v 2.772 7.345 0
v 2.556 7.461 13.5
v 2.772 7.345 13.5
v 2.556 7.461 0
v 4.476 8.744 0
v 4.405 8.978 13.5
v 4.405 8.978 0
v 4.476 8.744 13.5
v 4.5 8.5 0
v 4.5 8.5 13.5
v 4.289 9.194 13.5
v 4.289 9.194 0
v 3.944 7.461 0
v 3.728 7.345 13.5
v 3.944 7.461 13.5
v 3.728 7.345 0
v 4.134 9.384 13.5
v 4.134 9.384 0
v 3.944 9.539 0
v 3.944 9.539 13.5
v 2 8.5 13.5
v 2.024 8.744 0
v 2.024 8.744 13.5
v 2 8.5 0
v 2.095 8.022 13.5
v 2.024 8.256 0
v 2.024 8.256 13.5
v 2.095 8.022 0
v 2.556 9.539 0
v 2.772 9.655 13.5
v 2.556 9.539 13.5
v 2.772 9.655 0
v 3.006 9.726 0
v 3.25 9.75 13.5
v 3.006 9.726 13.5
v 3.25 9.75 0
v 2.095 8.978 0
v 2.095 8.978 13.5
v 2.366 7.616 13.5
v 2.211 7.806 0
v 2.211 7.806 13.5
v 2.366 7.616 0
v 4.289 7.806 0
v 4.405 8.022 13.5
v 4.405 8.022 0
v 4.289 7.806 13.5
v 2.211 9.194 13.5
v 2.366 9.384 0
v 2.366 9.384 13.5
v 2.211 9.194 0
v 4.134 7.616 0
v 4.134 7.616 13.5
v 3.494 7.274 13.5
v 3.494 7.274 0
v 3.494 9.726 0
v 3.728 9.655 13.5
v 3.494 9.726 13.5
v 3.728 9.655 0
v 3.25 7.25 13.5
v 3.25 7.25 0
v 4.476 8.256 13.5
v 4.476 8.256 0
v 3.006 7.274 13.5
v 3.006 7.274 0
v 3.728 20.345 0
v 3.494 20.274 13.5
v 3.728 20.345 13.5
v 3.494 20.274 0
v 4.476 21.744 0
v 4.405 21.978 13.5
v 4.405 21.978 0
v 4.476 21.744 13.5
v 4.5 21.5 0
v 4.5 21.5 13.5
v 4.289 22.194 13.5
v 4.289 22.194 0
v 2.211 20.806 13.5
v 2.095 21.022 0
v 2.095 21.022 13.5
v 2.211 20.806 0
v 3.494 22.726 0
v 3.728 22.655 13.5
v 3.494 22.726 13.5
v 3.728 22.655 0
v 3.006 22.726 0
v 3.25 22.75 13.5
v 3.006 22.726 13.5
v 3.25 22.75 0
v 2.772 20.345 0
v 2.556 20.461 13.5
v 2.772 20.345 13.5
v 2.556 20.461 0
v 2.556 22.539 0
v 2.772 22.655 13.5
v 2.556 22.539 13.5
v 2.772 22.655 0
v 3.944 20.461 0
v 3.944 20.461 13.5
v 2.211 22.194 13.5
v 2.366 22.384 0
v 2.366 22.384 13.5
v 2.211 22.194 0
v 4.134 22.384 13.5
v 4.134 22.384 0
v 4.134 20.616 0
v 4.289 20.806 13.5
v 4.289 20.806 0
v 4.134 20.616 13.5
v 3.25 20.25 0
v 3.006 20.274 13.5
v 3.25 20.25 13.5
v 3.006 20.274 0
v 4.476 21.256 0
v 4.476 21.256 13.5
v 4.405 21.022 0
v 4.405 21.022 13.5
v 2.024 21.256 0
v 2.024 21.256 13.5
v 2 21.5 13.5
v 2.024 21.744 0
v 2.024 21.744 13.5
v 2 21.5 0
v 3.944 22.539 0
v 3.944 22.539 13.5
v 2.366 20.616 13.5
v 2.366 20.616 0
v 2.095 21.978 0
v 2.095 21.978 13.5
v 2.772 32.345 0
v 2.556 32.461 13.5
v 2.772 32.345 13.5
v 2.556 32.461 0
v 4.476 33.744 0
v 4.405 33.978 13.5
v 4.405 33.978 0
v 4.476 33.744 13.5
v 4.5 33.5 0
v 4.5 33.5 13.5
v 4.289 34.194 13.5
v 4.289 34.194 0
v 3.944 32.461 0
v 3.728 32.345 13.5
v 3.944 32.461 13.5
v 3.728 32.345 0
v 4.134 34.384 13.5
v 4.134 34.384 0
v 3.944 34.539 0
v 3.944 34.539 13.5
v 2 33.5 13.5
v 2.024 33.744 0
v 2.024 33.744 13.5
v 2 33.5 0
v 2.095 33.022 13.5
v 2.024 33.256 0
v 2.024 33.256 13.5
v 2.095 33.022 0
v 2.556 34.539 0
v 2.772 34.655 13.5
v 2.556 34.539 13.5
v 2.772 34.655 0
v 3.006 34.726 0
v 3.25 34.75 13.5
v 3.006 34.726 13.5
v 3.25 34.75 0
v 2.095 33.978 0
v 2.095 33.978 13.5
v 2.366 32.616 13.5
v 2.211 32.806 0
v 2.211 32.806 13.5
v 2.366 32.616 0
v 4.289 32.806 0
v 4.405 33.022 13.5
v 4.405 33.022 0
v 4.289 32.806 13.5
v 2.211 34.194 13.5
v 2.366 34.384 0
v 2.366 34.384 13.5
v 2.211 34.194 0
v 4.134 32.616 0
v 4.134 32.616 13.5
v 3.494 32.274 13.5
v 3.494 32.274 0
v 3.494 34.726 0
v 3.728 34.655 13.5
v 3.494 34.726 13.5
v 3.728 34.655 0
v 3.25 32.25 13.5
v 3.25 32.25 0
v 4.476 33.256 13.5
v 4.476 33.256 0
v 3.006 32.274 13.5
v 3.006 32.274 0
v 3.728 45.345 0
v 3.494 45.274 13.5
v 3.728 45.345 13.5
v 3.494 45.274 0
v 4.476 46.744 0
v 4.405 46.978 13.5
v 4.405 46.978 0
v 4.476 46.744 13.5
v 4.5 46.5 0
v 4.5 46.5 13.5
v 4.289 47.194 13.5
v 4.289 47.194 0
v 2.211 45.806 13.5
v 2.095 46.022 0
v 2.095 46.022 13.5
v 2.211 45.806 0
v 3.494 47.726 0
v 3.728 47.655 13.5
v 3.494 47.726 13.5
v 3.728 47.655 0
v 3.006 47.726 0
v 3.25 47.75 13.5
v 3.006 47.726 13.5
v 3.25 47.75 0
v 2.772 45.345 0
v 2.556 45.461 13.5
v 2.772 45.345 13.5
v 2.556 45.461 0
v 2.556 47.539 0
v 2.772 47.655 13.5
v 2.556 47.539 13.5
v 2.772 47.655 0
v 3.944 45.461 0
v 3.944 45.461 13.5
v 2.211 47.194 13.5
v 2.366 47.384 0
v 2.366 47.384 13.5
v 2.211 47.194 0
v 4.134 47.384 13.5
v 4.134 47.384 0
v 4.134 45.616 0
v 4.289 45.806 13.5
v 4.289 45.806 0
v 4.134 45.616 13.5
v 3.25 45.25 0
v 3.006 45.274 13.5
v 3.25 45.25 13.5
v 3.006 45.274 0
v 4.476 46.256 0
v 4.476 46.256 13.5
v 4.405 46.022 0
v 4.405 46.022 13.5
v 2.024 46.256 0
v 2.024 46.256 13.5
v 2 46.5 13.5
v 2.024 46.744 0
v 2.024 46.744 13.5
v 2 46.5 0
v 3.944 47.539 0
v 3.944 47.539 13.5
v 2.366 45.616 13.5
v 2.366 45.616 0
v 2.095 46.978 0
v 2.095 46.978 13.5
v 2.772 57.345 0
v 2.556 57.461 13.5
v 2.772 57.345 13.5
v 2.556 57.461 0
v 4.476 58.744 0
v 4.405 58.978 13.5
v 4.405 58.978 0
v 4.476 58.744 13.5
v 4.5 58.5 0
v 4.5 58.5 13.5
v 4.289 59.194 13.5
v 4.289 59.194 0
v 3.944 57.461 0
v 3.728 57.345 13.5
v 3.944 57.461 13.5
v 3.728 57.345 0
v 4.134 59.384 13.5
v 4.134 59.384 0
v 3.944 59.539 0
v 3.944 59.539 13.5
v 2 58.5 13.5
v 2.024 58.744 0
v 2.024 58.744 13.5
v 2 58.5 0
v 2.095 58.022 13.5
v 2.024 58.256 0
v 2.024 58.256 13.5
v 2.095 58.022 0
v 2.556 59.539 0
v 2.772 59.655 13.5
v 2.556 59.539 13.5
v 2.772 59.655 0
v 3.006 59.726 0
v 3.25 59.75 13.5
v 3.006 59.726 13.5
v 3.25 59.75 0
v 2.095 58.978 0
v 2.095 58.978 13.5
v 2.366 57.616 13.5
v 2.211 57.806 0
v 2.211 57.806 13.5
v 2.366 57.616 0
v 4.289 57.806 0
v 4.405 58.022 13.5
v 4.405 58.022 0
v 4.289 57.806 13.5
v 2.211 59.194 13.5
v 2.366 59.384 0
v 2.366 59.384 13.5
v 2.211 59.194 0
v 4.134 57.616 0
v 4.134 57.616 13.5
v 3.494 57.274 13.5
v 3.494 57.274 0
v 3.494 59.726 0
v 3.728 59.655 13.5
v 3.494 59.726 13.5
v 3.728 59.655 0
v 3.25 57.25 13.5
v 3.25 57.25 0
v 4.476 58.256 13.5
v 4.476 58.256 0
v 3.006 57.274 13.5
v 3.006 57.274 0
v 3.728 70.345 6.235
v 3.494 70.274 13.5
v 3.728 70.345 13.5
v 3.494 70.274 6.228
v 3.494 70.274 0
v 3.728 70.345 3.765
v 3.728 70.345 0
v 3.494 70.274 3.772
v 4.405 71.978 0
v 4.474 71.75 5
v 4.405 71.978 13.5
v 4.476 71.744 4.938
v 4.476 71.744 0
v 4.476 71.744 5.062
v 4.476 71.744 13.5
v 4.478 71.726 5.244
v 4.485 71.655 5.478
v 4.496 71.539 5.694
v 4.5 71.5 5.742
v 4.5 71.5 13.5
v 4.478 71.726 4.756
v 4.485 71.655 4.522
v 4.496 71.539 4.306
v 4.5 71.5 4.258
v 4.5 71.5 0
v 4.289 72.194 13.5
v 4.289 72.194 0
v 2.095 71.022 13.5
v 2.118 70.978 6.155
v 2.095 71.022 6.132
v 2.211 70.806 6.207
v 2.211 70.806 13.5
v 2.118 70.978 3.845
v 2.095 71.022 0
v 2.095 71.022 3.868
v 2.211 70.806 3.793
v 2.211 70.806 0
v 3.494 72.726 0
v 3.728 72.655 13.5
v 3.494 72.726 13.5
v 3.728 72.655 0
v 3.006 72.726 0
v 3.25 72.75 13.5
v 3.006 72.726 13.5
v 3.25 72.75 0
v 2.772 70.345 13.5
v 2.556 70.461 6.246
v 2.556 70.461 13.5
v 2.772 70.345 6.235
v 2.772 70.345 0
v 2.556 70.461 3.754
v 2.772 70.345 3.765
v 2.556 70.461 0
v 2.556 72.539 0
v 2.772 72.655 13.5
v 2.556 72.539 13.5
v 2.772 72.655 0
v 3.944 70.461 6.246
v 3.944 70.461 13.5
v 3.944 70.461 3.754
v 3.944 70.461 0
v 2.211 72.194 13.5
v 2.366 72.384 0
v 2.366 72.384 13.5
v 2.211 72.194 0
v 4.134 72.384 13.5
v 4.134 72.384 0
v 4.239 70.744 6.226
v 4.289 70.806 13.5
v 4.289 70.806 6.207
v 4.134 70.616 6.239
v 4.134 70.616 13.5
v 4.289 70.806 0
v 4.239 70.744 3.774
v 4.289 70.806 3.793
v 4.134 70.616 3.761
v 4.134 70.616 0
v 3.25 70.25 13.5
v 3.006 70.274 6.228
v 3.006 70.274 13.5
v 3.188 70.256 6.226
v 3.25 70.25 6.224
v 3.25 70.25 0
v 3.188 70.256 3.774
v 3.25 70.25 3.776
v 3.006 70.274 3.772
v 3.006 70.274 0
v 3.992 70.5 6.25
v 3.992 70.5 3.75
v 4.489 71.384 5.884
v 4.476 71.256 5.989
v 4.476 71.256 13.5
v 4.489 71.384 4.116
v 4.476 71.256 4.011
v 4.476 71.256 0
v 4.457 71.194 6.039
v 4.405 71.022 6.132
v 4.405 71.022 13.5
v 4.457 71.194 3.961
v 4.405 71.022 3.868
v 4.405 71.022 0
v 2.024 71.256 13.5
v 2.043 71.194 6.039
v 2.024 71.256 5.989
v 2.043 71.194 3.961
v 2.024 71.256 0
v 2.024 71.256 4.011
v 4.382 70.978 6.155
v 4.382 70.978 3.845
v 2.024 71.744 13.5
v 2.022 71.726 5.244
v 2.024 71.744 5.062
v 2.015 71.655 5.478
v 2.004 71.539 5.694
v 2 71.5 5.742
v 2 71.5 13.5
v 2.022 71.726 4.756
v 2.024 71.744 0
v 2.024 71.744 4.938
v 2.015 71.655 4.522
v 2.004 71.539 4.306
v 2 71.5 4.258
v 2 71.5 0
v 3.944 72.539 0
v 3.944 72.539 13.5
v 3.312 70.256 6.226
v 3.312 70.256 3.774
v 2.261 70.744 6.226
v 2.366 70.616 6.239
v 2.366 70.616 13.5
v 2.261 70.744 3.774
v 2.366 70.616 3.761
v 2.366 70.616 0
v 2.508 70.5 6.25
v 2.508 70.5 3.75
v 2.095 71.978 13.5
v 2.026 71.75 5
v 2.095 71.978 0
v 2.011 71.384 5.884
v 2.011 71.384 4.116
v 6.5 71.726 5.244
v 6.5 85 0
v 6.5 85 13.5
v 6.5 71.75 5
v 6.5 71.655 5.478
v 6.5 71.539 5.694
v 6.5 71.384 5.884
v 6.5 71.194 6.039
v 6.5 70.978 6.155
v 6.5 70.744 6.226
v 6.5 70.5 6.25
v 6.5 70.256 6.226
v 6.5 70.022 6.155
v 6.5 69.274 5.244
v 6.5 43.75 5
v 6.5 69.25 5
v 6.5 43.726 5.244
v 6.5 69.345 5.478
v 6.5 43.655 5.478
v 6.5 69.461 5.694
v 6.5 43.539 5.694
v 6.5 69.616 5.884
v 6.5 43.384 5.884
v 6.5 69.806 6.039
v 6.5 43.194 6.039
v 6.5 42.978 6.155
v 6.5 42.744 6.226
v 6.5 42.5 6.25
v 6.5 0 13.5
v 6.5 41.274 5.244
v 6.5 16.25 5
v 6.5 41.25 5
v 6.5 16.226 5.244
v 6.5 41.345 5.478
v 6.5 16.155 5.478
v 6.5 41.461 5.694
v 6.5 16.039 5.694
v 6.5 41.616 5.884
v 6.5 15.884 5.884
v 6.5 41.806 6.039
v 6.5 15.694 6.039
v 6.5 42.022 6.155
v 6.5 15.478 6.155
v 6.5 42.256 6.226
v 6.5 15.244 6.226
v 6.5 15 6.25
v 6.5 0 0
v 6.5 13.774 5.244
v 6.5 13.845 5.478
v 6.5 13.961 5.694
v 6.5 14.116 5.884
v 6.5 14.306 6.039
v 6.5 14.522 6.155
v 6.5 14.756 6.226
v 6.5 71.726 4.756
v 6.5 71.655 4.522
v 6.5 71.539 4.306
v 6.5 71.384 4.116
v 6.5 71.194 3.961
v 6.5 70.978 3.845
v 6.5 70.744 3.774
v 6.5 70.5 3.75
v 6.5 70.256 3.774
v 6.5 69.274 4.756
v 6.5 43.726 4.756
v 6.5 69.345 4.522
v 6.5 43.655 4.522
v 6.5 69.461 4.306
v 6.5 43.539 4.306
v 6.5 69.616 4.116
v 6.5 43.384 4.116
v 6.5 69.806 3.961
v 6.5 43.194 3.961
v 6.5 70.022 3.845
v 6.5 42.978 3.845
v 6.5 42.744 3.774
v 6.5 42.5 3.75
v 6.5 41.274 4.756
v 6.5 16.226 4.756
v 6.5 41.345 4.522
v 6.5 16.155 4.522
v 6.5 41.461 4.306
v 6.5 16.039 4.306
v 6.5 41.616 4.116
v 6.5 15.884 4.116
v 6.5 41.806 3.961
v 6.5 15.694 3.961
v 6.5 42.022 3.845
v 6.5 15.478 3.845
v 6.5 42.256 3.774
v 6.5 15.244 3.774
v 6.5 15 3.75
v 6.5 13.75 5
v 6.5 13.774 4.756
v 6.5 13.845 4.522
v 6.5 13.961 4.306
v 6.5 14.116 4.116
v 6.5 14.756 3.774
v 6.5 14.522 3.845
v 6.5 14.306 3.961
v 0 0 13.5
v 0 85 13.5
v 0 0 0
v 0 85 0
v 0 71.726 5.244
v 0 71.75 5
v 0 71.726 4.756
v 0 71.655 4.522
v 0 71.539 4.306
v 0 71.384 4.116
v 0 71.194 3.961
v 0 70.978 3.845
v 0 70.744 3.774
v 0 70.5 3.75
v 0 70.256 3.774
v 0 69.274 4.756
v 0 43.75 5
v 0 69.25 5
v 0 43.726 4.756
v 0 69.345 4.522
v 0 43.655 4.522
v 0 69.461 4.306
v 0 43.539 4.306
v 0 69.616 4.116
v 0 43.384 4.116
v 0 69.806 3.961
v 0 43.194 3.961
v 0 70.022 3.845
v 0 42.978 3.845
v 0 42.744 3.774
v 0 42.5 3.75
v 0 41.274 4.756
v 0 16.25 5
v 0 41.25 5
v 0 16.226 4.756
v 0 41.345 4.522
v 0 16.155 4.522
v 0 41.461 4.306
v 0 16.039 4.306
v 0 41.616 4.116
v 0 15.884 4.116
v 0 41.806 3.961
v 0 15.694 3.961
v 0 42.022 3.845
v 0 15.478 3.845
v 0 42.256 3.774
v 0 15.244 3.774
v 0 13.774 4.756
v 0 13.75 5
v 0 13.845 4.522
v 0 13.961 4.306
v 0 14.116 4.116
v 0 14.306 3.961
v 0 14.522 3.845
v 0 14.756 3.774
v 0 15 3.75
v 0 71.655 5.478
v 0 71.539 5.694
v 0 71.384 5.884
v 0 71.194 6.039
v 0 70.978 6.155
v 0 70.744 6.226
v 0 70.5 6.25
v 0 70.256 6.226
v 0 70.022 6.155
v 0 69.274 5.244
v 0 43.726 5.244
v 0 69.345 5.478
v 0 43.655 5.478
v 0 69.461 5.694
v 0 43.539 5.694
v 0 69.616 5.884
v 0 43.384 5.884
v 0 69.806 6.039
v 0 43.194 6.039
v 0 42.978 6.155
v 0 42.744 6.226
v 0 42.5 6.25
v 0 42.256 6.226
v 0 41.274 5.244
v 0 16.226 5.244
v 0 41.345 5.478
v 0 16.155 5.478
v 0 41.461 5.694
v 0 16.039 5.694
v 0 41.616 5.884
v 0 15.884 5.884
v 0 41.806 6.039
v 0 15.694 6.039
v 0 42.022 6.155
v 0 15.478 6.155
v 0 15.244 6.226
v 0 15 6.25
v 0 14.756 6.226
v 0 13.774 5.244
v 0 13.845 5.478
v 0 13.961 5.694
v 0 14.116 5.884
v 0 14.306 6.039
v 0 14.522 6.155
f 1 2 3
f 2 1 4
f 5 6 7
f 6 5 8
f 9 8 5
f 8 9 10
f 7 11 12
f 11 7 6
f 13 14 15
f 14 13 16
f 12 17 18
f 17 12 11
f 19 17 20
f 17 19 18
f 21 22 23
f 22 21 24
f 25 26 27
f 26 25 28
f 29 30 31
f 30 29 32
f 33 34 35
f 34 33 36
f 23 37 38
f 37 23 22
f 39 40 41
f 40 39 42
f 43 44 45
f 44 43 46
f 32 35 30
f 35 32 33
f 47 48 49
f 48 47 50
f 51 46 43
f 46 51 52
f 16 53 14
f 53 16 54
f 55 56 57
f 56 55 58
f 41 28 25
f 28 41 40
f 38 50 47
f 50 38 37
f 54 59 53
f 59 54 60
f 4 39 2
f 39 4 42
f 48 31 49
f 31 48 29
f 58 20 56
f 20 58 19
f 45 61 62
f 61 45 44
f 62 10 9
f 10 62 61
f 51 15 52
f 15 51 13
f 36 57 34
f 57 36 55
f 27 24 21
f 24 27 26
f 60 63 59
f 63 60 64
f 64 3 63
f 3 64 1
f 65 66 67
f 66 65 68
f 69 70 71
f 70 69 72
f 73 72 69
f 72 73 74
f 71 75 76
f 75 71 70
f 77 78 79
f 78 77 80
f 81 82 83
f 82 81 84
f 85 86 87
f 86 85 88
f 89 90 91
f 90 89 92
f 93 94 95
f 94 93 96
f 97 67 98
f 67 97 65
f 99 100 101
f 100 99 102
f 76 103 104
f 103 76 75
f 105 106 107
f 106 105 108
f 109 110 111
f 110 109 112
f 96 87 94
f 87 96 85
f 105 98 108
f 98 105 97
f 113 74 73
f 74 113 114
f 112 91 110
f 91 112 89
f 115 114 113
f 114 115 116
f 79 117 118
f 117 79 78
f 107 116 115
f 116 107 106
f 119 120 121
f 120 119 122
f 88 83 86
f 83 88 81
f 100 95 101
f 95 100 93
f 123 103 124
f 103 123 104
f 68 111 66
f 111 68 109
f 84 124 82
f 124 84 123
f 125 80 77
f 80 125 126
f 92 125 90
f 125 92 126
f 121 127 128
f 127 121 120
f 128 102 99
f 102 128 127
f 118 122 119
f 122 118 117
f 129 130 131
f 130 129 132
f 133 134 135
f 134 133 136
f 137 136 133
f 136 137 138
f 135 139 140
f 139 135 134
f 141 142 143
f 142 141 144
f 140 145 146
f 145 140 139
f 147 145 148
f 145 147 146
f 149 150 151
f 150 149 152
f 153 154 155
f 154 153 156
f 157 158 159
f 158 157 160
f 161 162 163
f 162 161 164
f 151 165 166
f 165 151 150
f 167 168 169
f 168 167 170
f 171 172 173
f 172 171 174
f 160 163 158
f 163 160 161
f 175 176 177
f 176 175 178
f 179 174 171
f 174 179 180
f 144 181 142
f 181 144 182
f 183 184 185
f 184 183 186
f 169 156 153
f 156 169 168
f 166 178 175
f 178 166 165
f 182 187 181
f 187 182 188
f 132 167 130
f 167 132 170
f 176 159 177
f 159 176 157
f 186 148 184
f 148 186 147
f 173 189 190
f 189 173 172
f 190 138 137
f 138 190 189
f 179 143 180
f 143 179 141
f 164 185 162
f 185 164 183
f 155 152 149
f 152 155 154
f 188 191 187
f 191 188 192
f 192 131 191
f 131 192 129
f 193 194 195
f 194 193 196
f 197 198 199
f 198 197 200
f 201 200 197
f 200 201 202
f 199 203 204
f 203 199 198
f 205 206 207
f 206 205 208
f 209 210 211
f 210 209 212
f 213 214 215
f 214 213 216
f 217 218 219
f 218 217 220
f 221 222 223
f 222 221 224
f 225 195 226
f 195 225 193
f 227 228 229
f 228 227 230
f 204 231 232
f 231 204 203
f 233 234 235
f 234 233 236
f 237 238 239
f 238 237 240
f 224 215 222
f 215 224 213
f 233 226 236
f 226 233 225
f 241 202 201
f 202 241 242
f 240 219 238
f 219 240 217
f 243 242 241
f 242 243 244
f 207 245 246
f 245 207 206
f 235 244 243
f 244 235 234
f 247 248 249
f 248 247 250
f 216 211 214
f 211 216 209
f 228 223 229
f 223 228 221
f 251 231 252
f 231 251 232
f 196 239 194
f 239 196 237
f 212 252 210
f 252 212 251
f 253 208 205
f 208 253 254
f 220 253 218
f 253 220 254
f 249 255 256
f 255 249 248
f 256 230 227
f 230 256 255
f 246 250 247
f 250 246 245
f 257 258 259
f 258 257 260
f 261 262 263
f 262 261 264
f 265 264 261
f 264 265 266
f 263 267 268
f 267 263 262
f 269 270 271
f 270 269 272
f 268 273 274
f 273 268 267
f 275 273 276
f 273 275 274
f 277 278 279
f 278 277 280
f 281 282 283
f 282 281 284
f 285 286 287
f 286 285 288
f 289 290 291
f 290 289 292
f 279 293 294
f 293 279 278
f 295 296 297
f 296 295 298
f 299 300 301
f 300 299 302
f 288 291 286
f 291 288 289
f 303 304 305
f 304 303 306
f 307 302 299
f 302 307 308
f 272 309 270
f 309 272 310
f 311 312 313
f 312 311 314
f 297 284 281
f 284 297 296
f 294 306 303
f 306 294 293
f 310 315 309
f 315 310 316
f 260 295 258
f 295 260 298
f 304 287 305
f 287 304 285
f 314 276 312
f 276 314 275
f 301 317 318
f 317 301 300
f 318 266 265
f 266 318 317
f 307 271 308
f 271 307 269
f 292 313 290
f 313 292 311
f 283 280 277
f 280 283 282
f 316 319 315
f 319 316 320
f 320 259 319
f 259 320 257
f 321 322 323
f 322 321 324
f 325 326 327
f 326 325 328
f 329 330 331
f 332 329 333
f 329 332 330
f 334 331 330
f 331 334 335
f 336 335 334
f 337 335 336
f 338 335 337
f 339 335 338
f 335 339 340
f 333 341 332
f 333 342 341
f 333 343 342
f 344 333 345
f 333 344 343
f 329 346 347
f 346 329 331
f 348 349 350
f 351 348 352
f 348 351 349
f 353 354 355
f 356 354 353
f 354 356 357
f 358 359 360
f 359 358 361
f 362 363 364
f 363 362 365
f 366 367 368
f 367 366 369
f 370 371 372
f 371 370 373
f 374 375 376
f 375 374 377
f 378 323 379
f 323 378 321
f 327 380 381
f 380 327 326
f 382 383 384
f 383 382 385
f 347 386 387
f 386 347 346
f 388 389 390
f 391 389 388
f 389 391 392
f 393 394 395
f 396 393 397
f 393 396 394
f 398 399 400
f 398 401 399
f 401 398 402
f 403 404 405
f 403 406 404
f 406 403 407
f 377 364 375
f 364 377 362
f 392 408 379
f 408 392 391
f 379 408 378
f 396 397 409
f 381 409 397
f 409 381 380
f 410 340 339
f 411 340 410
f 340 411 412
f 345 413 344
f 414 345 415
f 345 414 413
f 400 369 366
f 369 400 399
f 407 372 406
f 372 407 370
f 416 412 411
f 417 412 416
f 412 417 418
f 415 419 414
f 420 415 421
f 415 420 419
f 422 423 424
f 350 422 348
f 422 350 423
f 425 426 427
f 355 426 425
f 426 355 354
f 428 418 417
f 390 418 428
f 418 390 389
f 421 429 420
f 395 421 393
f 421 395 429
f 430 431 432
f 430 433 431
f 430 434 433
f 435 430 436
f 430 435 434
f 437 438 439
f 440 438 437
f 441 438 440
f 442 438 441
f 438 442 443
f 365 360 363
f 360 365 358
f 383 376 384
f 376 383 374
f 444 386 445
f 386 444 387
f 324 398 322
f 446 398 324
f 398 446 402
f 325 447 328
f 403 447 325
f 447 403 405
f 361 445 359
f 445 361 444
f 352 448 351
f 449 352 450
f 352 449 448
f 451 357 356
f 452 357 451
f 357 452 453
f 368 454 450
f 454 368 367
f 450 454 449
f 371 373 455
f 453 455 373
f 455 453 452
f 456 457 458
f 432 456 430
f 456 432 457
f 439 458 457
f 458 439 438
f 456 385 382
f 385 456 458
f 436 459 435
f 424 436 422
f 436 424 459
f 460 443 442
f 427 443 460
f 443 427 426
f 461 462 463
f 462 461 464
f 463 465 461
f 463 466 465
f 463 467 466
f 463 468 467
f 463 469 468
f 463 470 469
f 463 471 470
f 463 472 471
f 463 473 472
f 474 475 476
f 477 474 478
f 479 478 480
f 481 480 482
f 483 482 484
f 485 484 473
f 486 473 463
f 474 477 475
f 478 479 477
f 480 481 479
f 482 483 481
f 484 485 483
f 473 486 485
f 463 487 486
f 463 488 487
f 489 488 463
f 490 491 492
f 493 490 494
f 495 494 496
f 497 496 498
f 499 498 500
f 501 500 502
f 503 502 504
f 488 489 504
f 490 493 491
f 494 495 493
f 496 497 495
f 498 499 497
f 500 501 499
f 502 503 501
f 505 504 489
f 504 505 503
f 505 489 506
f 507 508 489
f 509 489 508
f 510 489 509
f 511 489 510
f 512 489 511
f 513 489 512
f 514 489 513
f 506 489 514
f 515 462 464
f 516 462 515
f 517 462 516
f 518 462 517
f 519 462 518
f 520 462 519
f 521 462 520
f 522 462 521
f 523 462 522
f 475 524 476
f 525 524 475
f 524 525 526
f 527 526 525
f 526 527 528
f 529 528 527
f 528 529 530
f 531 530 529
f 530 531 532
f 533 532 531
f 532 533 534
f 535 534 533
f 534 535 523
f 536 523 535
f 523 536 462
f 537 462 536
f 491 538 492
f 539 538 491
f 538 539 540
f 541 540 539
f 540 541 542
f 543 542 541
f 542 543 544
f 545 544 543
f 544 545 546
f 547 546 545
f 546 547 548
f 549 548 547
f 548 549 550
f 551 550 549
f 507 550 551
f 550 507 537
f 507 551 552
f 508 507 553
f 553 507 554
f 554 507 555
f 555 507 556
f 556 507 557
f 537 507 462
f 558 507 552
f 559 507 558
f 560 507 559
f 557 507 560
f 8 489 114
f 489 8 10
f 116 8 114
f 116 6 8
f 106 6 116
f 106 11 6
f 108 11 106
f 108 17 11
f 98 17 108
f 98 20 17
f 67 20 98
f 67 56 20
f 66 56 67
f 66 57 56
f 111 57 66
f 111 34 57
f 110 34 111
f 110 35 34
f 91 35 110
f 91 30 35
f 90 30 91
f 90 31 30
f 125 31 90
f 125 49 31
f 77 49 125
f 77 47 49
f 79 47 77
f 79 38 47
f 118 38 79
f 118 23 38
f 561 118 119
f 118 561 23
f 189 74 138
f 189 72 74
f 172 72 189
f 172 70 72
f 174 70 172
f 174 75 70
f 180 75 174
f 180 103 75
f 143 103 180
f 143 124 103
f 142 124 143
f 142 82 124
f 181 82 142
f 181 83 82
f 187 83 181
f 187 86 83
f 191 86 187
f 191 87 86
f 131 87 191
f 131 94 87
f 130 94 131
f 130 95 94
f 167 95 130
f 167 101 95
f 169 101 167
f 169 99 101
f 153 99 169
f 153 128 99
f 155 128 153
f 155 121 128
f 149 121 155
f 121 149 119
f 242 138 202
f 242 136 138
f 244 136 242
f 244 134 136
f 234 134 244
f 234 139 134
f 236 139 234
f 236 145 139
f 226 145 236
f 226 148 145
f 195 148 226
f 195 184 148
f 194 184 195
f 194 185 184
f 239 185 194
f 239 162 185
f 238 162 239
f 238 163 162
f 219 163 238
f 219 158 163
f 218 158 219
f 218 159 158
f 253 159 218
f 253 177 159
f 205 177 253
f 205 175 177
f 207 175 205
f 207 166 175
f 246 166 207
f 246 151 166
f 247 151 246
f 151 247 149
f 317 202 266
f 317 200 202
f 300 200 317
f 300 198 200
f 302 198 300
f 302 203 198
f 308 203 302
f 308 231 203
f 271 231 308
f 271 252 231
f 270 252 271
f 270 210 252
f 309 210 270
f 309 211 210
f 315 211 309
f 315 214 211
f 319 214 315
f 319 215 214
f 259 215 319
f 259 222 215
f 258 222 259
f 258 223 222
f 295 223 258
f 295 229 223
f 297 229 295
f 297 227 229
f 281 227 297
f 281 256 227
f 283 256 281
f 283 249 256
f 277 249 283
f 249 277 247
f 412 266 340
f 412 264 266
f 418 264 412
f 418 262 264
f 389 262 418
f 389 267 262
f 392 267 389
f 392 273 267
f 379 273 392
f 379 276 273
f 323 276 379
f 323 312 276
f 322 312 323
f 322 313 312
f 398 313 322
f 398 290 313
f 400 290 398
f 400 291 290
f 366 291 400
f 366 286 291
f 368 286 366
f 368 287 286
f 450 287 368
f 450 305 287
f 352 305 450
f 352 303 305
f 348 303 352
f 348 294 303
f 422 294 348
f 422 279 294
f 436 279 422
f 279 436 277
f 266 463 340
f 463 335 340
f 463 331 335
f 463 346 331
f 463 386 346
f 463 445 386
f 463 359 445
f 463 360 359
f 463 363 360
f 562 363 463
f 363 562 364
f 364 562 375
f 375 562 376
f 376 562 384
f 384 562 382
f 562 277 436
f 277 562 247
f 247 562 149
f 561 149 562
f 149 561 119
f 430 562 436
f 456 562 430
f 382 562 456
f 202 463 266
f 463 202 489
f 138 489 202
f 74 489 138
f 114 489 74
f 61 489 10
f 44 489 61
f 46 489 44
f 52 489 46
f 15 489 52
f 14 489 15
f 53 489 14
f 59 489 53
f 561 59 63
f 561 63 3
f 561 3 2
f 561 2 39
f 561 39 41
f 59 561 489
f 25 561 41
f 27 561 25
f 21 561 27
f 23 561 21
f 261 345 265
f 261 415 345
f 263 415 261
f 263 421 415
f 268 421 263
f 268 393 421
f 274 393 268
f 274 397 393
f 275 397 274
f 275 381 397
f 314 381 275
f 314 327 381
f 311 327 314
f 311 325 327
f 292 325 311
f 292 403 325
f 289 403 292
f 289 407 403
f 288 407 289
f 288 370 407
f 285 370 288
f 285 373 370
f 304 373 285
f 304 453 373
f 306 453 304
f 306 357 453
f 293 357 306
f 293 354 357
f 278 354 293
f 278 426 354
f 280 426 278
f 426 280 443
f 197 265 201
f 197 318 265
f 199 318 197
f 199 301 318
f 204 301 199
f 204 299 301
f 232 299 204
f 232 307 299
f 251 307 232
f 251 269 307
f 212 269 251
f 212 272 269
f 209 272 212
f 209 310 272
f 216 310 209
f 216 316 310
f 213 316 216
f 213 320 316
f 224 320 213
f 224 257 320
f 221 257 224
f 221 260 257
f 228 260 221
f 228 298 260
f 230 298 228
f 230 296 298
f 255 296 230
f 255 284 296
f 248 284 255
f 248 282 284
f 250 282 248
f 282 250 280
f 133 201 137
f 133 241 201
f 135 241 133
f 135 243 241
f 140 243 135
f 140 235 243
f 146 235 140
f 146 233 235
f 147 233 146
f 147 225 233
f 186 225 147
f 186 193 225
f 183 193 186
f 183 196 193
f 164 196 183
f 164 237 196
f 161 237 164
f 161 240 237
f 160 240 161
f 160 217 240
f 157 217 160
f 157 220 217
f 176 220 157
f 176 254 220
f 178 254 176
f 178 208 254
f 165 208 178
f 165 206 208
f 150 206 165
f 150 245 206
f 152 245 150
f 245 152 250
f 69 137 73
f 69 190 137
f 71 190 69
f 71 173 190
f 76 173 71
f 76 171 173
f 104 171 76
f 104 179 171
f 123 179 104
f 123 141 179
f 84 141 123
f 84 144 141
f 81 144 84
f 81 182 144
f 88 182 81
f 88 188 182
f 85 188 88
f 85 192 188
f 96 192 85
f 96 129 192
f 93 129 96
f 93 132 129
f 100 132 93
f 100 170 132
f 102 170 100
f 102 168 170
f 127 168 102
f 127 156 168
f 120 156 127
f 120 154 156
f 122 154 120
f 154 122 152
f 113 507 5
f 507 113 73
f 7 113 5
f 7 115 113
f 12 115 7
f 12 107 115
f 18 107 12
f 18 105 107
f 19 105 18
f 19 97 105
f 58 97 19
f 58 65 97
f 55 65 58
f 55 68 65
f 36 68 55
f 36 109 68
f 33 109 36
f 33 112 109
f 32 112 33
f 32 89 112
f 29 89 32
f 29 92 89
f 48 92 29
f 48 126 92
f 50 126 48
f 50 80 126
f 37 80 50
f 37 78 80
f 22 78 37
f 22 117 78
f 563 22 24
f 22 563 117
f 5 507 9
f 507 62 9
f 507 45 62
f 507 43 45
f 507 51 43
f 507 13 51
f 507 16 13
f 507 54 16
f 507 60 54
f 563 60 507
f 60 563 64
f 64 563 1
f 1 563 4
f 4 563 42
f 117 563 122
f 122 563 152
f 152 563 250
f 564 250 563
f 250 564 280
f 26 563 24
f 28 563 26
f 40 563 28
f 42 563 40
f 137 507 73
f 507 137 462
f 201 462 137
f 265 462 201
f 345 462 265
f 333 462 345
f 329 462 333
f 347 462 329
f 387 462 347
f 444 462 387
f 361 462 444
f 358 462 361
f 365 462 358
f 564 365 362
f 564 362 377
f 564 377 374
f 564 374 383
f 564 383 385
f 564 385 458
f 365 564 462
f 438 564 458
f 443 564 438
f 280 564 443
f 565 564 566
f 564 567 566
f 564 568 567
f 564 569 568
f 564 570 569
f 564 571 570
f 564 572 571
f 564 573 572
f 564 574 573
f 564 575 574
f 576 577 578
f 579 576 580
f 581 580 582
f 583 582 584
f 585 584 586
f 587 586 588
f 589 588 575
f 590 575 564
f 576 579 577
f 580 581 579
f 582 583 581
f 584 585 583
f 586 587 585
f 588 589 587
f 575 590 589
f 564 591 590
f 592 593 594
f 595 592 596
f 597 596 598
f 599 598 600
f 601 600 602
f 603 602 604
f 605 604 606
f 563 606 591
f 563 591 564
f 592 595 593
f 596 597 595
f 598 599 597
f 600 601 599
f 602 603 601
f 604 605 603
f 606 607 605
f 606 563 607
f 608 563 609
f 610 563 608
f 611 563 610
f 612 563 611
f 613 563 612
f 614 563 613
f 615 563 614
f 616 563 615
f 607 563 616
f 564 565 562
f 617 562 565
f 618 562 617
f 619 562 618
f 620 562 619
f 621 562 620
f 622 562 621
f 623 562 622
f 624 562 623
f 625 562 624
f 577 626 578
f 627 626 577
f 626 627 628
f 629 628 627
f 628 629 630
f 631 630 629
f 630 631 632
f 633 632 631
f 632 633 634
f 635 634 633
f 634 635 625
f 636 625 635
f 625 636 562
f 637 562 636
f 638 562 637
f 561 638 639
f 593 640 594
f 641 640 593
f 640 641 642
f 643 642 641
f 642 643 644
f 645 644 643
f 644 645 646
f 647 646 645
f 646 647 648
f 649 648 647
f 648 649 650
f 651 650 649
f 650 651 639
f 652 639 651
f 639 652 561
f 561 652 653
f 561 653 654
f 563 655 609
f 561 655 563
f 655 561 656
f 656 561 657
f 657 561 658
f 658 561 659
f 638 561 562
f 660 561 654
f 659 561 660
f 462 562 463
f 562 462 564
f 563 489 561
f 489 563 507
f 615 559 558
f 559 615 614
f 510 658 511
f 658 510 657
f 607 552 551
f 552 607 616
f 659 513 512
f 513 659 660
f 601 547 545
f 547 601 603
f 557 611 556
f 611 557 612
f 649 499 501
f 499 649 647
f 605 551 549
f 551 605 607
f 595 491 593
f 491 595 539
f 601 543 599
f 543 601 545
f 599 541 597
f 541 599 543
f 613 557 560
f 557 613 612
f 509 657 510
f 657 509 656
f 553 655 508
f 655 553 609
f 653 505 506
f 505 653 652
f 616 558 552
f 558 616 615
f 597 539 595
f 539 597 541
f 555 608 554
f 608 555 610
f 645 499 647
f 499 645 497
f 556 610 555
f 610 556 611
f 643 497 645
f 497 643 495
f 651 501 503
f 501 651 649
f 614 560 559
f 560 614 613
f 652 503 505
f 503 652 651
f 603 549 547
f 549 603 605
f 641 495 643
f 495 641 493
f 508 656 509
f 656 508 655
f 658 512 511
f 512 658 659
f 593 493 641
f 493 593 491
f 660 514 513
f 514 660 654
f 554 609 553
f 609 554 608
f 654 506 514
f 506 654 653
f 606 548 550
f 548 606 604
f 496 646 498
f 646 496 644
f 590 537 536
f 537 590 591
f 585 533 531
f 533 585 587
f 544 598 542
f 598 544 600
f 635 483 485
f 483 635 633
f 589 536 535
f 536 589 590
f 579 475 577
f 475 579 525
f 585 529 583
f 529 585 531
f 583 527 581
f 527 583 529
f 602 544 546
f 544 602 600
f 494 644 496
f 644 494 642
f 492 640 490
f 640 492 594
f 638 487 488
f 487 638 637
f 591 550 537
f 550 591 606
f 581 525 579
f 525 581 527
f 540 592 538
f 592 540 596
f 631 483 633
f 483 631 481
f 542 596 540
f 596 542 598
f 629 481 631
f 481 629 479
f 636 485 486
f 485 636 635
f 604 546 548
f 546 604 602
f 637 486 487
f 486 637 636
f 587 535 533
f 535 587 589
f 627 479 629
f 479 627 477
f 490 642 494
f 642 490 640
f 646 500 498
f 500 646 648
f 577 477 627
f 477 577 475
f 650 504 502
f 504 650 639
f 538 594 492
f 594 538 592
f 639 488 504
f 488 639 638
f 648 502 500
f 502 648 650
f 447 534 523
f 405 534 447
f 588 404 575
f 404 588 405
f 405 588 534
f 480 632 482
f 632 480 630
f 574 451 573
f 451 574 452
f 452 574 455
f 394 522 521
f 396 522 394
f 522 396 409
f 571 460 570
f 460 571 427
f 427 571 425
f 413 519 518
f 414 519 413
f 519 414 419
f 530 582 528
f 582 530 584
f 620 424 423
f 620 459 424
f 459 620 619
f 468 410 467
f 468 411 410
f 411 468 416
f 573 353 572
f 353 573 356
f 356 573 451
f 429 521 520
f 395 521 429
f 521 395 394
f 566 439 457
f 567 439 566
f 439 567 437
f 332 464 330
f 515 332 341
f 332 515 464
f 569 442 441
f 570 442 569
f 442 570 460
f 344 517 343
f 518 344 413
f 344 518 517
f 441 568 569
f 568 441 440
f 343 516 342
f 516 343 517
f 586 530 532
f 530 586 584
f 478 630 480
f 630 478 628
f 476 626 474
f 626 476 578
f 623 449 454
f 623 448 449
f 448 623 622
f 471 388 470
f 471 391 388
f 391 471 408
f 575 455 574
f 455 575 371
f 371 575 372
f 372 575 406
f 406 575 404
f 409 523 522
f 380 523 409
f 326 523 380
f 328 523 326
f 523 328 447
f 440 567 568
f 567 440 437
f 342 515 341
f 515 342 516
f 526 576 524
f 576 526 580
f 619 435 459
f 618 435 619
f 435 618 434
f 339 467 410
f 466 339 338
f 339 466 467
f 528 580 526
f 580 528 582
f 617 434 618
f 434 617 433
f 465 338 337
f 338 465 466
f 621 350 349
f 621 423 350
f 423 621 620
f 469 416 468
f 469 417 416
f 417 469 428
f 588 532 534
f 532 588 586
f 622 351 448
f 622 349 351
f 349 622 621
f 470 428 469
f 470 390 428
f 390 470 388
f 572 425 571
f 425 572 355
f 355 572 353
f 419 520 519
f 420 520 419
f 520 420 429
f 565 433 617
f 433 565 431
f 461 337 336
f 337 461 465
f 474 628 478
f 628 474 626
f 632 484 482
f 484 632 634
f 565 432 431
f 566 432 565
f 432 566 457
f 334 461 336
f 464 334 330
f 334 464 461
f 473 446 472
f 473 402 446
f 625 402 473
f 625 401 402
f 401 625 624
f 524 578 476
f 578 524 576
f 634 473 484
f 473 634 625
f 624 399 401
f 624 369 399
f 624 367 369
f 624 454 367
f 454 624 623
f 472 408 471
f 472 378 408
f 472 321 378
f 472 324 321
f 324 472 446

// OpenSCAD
//EuroCardGuidebase3

$fn = 32;

ECBeamHeight = 13.5;
ECBeamWidth = 6.5;
ECBeamLength = 85.0;

mountHoleDist = 13.0;
mountHole1Offset = 15.0;
mountHole2Offset = mountHole1Offset + 25.0;
mountHole3Offset = mountHole1Offset + 50.0;
mountHole = 2.5;

bpHole1Offset = 15.0;
bpHole2Offset = 42.5;
bpHole3Offset = 70.5;
bpHoleZOffset = 5.0;

module beam() {
    cube([ECBeamWidth, ECBeamLength, ECBeamHeight]);
}

module mountHoleSet() {
    translate([0, -mountHoleDist / 2, 0]) cylinder(d = mountHole, h = ECBeamHeight + 0.02);
    translate([0, mountHoleDist / 2, 0]) cylinder(d = mountHole, h = ECBeamHeight + 0.02);
}

difference() {
    beam();
    translate([ECBeamWidth / 2, 0, -0.01]) {
        // guide 1
        translate([0, mountHole1Offset, 0]) mountHoleSet();
        // guide 2
        translate([0, mountHole2Offset, 0]) mountHoleSet();
        // guide 3
        translate([0, mountHole3Offset, 0]) mountHoleSet();
    }
    // back plane hole 1
    translate([-0.01, bpHole1Offset, bpHoleZOffset]) rotate([0, 90, 0]) 
        cylinder(d = mountHole, h = ECBeamWidth + 0.02);
    translate([-0.01, bpHole2Offset, bpHoleZOffset]) rotate([0, 90, 0]) 
        cylinder(d = mountHole, h = ECBeamWidth + 0.02);
    translate([-0.01, bpHole3Offset, bpHoleZOffset]) rotate([0, 90, 0]) 
        cylinder(d = mountHole, h = ECBeamWidth + 0.02); 
    //20.5
//    translate([-0.01, 15.0, 0]) rotate([0, 90, 0]) cylinder(d = 1, h = ECBeamWidth + 0.02);
//    translate([-0.01, 40.0, 0]) rotate([0, 90, 0]) cylinder(d = 1, h = ECBeamWidth + 0.02);
//    translate([-0.01, 65.0, 0]) rotate([0, 90, 0]) cylinder(d = 1, h = ECBeamWidth + 0.02);
    
    
}
